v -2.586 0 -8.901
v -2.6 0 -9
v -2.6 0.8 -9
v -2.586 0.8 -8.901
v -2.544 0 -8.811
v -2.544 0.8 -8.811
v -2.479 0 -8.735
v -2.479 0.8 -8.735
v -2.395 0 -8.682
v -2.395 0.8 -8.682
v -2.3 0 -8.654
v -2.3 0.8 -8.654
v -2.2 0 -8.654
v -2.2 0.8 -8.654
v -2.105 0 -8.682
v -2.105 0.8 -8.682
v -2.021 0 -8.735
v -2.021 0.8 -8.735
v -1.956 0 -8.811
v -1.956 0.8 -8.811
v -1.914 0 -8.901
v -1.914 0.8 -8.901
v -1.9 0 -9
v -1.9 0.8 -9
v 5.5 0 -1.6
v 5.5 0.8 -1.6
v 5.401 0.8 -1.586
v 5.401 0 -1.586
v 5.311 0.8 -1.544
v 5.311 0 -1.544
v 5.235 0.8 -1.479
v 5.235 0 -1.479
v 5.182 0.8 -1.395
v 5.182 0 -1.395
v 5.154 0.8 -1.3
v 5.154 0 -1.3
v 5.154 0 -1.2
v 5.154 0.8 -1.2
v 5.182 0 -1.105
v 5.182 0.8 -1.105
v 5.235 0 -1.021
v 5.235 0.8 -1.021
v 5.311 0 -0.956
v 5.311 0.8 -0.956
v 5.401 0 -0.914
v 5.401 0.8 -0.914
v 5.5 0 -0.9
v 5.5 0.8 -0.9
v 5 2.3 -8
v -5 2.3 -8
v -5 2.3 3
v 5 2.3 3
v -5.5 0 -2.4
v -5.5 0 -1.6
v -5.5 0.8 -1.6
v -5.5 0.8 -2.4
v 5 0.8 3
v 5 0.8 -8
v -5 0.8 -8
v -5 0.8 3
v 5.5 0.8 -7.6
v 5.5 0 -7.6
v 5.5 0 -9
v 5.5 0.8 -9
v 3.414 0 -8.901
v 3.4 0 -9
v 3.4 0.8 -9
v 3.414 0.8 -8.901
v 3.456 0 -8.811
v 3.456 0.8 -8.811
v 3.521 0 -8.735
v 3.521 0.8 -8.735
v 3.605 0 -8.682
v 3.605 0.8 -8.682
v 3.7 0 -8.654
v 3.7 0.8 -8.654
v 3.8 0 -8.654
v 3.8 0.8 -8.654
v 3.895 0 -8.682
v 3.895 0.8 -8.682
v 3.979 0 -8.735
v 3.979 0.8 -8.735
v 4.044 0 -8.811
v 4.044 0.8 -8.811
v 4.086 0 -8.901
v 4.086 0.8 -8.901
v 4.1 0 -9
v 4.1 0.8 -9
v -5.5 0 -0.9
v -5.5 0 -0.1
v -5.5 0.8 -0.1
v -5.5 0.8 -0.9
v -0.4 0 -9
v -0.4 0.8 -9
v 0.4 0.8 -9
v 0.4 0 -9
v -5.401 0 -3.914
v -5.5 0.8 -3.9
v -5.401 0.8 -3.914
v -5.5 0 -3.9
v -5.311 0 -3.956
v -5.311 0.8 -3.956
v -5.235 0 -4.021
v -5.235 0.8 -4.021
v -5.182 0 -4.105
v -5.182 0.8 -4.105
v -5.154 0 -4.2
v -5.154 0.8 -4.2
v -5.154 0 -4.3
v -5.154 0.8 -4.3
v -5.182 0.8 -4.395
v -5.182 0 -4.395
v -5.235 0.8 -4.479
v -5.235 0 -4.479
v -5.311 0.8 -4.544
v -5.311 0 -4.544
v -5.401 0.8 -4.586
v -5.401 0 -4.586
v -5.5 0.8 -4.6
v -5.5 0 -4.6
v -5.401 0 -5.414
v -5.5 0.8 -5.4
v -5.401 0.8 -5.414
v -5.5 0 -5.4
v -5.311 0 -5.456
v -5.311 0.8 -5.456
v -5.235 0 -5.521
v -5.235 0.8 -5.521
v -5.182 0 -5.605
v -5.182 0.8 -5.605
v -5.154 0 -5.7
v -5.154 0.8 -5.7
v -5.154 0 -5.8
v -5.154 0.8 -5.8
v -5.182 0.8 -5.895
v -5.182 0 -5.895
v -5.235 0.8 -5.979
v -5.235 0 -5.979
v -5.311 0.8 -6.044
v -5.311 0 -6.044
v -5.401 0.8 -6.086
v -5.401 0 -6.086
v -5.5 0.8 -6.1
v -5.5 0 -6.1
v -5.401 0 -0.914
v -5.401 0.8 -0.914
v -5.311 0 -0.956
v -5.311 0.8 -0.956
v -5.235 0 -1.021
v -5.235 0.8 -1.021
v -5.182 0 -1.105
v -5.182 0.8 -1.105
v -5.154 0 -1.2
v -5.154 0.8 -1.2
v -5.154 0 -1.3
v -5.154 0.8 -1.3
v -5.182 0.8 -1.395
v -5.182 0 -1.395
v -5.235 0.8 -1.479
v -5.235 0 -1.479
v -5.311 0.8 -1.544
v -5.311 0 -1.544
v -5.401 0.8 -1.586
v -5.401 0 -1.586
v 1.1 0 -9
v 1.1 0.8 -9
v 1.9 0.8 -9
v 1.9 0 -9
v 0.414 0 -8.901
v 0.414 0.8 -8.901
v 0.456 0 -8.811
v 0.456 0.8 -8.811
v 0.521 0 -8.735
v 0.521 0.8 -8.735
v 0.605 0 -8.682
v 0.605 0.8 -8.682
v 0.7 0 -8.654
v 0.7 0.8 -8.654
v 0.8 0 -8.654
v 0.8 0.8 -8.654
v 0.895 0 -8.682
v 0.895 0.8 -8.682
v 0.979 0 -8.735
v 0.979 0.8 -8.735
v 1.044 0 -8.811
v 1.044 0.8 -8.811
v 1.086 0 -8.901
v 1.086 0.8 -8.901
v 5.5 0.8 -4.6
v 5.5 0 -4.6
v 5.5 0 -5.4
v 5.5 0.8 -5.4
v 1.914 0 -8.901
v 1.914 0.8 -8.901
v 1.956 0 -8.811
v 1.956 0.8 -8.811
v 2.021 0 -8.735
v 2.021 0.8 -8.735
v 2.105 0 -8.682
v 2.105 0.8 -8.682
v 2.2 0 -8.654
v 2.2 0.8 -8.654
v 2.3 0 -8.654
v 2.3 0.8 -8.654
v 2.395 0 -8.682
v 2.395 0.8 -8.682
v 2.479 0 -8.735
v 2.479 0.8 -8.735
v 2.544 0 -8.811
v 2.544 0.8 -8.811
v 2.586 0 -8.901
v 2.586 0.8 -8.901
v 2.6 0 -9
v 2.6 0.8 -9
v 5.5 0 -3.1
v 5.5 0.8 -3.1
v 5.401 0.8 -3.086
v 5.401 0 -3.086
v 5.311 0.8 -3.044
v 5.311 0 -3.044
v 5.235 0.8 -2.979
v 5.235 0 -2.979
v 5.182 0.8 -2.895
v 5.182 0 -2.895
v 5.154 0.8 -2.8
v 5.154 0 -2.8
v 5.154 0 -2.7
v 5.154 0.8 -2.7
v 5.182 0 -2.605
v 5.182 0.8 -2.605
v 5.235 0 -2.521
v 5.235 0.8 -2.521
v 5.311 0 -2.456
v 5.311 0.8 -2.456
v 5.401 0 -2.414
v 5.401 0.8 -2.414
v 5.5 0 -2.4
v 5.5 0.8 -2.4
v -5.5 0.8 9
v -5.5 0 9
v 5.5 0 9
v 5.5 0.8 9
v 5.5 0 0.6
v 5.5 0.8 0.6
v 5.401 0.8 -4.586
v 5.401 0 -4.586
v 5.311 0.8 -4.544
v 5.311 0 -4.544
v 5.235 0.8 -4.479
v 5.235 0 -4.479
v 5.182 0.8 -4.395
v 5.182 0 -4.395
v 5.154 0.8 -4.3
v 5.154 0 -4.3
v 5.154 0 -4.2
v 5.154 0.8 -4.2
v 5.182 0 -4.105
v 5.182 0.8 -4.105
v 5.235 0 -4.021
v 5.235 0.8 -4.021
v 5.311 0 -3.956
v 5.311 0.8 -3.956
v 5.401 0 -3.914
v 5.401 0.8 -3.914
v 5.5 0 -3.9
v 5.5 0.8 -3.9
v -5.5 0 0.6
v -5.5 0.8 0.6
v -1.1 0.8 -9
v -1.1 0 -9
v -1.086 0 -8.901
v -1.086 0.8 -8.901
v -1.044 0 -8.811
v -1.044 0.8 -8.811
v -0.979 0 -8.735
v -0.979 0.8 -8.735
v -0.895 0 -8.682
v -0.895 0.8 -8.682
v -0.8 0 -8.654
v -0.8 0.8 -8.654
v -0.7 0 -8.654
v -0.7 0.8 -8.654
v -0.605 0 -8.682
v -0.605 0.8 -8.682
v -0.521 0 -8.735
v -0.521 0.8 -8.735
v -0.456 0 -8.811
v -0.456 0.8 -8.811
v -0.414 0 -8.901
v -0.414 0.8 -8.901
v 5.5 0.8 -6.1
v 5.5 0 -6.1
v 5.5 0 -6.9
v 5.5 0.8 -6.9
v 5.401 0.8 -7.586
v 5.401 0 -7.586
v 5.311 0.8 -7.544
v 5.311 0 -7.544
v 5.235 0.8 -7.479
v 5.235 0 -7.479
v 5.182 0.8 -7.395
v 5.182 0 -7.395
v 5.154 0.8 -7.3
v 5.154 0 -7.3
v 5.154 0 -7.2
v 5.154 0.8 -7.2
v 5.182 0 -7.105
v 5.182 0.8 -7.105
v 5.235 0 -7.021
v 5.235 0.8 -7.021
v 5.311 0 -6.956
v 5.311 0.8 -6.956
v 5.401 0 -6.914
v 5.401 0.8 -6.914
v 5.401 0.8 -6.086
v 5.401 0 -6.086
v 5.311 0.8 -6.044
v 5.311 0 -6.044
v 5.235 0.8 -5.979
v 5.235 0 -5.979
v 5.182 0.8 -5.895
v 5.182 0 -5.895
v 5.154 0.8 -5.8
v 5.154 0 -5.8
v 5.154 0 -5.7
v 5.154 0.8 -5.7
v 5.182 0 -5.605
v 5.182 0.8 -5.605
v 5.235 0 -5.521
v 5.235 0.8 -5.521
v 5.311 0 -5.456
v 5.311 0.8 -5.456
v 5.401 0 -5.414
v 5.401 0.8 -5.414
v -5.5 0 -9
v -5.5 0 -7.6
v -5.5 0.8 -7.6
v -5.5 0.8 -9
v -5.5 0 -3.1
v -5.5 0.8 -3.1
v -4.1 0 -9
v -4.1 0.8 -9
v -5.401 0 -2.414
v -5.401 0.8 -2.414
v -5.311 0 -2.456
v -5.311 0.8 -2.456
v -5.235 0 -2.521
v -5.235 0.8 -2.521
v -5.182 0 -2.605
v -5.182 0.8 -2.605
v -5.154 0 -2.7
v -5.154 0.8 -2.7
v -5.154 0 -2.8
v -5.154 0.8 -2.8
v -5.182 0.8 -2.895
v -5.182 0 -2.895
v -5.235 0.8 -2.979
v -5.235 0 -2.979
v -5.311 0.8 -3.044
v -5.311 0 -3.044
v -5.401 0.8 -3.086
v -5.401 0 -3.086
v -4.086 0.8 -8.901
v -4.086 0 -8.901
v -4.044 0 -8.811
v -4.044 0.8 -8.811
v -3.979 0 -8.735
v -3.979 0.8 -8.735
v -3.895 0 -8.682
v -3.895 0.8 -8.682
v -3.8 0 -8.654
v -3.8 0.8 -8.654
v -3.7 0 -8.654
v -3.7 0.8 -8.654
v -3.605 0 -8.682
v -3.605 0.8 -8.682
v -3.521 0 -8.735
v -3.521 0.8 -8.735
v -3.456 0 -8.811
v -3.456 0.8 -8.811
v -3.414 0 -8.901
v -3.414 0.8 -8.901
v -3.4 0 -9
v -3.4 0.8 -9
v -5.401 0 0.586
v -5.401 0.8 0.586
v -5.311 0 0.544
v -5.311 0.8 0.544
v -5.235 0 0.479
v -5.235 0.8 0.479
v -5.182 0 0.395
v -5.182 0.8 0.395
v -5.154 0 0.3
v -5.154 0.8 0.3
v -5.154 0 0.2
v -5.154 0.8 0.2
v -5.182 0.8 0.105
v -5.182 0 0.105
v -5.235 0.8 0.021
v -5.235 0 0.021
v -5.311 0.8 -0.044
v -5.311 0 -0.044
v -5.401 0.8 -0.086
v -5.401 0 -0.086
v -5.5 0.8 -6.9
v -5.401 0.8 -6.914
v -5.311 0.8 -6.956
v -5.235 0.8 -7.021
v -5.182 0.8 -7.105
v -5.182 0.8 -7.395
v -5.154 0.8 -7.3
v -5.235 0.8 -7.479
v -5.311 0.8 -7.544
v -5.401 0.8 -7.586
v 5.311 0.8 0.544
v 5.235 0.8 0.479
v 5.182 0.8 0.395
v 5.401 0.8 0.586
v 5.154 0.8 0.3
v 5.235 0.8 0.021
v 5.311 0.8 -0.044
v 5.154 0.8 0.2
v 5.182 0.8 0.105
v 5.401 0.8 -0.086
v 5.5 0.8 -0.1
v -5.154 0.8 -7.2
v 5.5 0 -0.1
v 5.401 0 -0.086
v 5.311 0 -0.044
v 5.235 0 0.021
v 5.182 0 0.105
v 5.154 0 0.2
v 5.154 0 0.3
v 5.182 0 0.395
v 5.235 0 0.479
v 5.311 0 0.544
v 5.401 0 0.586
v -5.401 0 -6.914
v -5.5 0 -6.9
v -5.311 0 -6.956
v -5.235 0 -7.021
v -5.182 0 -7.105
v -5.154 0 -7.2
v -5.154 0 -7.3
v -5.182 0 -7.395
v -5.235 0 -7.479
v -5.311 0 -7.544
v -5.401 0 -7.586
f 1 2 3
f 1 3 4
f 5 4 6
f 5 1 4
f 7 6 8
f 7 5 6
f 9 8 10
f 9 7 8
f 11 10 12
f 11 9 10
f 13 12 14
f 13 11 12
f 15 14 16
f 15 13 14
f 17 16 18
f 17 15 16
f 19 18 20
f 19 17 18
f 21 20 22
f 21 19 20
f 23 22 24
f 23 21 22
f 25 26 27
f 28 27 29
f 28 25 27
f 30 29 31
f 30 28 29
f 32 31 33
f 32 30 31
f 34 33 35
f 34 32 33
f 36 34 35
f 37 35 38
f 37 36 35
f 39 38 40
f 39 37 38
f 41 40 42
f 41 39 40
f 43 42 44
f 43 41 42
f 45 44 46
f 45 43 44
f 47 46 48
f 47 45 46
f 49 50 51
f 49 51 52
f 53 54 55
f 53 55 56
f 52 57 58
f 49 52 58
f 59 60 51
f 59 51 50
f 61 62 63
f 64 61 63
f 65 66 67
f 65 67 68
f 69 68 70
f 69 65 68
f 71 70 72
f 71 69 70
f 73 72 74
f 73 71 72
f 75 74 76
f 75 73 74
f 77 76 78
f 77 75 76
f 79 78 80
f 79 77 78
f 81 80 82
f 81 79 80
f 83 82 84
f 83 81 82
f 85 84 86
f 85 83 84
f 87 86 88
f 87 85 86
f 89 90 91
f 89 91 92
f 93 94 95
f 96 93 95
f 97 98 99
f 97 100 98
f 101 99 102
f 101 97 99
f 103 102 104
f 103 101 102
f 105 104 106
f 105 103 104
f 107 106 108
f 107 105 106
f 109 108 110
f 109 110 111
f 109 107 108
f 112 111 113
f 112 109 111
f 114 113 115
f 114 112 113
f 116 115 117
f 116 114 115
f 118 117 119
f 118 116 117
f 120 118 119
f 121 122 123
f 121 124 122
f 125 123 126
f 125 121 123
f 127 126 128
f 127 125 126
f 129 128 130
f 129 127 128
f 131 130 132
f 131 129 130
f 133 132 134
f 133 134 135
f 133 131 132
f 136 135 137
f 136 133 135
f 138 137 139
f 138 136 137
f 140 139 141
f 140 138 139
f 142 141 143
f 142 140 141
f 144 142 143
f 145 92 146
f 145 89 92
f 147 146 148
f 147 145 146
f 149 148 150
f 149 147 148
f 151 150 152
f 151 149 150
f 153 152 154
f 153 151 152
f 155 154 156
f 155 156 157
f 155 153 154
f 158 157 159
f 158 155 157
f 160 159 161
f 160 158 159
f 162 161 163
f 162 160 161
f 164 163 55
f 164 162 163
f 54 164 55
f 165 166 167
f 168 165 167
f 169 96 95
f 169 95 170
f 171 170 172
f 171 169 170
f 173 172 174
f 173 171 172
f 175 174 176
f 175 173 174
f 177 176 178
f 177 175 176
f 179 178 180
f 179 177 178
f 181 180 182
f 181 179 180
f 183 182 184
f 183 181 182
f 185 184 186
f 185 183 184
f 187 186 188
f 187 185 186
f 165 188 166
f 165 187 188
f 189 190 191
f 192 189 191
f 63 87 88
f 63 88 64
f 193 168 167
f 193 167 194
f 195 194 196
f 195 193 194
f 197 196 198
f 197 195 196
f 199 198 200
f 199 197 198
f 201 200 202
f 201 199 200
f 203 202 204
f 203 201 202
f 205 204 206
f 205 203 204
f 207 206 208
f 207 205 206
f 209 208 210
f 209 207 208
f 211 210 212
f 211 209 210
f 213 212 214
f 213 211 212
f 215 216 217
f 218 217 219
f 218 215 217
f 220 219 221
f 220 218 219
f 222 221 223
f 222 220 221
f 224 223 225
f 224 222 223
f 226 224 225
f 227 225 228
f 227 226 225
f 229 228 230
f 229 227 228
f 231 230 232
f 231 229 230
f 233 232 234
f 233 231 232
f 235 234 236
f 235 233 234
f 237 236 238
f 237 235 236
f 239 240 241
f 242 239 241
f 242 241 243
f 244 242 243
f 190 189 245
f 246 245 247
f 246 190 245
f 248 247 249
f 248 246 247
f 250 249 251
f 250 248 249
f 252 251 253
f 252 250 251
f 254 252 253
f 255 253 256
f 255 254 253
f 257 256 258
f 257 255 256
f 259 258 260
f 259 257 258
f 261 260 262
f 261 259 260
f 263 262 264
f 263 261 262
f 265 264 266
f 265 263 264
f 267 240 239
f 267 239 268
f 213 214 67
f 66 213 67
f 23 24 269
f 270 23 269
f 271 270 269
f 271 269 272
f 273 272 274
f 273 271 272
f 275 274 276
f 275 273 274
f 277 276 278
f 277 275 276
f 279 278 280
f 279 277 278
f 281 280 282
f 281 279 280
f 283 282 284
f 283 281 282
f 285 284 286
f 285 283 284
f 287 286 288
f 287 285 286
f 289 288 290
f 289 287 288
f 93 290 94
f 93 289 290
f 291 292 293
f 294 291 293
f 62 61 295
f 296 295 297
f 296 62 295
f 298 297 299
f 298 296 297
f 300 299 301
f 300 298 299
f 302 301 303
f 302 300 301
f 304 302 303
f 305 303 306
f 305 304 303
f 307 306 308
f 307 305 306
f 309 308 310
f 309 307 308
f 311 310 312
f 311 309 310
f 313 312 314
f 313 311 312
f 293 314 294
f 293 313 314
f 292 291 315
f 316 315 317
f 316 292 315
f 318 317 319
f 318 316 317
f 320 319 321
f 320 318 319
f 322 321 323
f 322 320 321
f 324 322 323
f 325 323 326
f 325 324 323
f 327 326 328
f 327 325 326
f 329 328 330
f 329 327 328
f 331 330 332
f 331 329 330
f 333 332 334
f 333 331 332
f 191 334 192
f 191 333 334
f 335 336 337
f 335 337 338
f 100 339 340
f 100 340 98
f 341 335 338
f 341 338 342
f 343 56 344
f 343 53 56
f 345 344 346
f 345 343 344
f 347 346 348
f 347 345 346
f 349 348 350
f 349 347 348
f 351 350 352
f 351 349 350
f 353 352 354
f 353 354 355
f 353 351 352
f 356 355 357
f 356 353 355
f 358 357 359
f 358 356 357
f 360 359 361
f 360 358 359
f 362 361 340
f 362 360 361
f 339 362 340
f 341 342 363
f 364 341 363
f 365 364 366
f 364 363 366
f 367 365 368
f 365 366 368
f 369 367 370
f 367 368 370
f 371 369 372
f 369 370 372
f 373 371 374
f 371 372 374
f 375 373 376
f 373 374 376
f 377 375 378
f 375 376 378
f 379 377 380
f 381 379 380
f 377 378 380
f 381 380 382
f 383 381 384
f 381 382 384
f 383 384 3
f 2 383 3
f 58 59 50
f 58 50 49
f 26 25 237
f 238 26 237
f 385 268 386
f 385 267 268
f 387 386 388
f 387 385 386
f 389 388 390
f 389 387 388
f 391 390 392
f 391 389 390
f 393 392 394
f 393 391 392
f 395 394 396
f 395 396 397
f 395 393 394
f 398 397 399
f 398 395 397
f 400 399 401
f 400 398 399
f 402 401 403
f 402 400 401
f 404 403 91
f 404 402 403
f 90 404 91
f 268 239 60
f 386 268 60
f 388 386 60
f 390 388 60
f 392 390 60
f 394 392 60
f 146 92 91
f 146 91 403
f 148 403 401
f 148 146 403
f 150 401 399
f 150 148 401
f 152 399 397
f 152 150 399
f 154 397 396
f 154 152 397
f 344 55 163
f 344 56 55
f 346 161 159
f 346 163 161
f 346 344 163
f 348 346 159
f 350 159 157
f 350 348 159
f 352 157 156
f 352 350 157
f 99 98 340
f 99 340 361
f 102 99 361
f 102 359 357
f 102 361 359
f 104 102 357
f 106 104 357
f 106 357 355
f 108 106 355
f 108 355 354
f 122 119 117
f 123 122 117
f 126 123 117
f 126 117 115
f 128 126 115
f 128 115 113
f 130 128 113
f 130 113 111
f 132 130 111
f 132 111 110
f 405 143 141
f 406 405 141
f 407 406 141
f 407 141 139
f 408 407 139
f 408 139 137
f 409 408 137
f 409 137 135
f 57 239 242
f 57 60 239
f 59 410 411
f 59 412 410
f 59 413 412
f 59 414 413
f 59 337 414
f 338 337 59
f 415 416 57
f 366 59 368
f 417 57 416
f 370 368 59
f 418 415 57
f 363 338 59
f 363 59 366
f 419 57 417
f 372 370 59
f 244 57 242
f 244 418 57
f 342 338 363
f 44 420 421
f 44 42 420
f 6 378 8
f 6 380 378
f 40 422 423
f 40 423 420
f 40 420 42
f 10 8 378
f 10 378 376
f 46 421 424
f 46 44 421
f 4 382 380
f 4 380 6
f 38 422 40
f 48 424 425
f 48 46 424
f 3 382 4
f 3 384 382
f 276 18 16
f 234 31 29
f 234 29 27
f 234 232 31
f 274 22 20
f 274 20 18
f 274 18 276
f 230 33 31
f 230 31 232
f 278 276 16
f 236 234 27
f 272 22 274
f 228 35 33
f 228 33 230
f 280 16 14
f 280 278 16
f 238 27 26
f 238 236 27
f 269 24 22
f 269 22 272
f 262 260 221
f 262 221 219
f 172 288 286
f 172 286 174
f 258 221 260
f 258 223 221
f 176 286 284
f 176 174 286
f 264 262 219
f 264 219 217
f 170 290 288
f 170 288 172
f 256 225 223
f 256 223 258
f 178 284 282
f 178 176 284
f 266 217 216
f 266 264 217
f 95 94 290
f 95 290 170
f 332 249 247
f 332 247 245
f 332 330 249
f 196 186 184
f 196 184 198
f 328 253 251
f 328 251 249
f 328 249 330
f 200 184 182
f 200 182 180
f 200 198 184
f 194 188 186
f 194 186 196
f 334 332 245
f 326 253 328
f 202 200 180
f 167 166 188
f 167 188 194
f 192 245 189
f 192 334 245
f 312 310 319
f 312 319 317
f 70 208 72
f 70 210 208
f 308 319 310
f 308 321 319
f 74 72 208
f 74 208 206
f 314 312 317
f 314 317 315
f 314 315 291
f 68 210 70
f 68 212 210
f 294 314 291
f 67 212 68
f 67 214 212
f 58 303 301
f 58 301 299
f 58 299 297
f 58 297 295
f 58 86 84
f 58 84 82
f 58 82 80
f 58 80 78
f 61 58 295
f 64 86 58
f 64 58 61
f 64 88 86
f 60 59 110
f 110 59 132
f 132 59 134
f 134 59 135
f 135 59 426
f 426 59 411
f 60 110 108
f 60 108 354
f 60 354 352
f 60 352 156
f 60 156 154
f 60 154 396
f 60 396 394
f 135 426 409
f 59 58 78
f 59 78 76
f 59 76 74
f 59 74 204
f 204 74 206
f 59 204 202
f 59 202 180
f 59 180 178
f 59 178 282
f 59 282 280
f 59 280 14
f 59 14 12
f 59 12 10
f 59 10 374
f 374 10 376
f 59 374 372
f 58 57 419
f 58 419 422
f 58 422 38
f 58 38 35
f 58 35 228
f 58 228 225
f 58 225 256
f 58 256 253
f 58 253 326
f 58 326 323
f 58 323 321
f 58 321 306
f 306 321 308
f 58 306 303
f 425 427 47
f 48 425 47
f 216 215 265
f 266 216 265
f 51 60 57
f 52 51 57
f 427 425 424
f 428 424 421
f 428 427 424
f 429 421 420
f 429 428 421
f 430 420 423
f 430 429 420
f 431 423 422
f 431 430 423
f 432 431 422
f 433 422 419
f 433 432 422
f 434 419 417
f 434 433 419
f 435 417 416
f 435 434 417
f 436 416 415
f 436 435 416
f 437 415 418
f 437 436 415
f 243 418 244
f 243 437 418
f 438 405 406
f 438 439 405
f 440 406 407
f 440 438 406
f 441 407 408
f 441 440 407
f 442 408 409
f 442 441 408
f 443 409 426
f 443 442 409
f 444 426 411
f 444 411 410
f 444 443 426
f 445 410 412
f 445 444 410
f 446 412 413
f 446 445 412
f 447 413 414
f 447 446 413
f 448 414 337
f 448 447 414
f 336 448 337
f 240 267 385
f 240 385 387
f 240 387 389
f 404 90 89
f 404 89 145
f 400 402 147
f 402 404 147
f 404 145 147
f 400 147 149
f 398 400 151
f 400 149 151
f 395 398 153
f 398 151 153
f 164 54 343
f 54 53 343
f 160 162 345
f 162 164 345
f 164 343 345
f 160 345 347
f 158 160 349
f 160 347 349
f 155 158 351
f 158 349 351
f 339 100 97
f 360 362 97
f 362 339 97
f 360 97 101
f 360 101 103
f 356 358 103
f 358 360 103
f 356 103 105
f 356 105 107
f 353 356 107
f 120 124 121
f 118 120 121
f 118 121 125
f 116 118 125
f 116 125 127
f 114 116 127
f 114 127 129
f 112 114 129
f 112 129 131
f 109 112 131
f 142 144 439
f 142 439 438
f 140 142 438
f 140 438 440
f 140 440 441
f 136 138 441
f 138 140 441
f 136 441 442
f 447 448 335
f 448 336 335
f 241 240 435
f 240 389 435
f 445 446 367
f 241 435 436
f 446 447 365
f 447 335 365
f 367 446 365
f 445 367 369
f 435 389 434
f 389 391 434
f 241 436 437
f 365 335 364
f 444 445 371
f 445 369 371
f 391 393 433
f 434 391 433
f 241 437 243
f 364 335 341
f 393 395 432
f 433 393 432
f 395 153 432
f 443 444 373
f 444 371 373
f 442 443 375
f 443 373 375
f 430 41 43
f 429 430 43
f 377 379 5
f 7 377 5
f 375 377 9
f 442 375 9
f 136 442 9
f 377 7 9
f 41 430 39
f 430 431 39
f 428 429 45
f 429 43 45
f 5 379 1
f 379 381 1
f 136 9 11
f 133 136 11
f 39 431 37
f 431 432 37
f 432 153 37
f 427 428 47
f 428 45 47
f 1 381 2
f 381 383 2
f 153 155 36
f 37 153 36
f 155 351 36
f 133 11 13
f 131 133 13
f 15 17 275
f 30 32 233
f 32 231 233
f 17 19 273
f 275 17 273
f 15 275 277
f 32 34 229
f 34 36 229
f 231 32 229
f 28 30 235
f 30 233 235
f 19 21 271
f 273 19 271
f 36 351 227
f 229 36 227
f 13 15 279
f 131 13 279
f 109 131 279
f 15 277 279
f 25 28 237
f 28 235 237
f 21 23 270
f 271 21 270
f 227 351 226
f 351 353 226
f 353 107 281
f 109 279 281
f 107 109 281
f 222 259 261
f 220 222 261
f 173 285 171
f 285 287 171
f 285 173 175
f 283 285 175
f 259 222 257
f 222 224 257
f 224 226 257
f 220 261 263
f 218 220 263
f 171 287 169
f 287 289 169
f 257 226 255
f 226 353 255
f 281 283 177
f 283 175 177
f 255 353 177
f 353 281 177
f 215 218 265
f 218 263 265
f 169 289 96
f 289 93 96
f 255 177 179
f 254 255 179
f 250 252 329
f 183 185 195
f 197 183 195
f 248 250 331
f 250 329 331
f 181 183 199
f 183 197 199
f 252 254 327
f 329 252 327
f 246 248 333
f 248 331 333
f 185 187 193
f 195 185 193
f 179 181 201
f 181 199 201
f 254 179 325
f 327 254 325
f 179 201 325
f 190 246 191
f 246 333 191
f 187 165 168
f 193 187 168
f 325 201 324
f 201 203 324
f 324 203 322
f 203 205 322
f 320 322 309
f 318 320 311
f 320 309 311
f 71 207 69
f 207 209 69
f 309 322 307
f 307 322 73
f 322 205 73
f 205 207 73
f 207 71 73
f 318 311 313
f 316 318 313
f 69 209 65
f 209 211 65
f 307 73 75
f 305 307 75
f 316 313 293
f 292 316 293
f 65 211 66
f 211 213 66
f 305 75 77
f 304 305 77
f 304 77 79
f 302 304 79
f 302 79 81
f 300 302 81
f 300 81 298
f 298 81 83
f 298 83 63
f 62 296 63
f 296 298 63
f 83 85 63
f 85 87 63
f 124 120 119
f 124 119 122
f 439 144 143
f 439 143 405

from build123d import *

# Parameters (mm, degrees)
SKETCH_2_W               = 11
SKETCH_2_H               = 18
EXTRUDE_1_DEPTH          = 0.8
SKETCH_3_W               = 10
SKETCH_3_H               = 11
EXTRUDE_3_DEPTH          = 2.3
SKETCH_7_R               = 0.35
CUT_EXTRUDE_1_DEPTH      = 2.3
SKETCH_9_R               = 0.35
CUT_EXTRUDE_2_DEPTH      = 2.3
CUT_EXTRUDE_2_DEPTH_BACK = 2.3
SKETCH_10_R              = 0.35
CUT_EXTRUDE_5_DEPTH      = 2.3
CUT_EXTRUDE_5_DEPTH_BACK = 2.3


with BuildPart() as part:
    # 草图2 → 凸台-拉伸1 (new body)
    with BuildSketch(Plane(origin=(0, 0, 0), x_dir=(1, 0, 0), z_dir=(0, 1, 0))):
        Rectangle(SKETCH_2_W, SKETCH_2_H)
    extrude(amount=EXTRUDE_1_DEPTH)

    # 草图3 → 凸台-拉伸3 (add)
    with BuildSketch(Plane(origin=(0, 0, 0), x_dir=(1, 0, 0), z_dir=(0, 1, 0))):
        with Locations((0, 2.5)):
            Rectangle(SKETCH_3_W, SKETCH_3_H)
    extrude(amount=EXTRUDE_3_DEPTH)

    # 草图7 → 切除-拉伸1 (cut)
    with BuildSketch(Plane(origin=(0, 0.8, 0), x_dir=(1, 0, 0), z_dir=(0, 1, 0))):
        with Locations((-3.75, 9)):
            Circle(SKETCH_7_R)
    extrude(amount=-CUT_EXTRUDE_1_DEPTH, mode=Mode.SUBTRACT)

    # 草图9 → 切除-拉伸2 (cut, two sides)
    with BuildSketch(Plane(origin=(0, 0, 0), x_dir=(1, 0, 0), z_dir=(0, 1, 0))) as cut_extrude_2_sk:
        with Locations((-2.25, 9)):
            Circle(SKETCH_9_R)
        with Locations((-0.75, 9)):
            Circle(SKETCH_9_R)
        with Locations((0.75, 9)):
            Circle(SKETCH_9_R)
        with Locations((3.75, 9)):
            Circle(SKETCH_9_R)
        with Locations((2.25, 9)):
            Circle(SKETCH_9_R)
    extrude(amount=CUT_EXTRUDE_2_DEPTH, mode=Mode.SUBTRACT)
    extrude(cut_extrude_2_sk.sketch, amount=-CUT_EXTRUDE_2_DEPTH_BACK, mode=Mode.SUBTRACT)

    # 草图10 → 切除-拉伸5 (cut, two sides)
    with BuildSketch(Plane(origin=(0, 0, 0), x_dir=(1, 0, 0), z_dir=(0, 1, 0))) as cut_extrude_5_sk:
        with Locations((-5.5, 7.25)):
            Circle(SKETCH_10_R)
        with Locations((5.5, 7.25)):
            Circle(SKETCH_10_R)
        with Locations((5.5, -0.25)):
            Circle(SKETCH_10_R)
        with Locations((-5.5, 2.75)):
            Circle(SKETCH_10_R)
        with Locations((5.5, 5.75)):
            Circle(SKETCH_10_R)
        with Locations((-5.5, 4.25)):
            Circle(SKETCH_10_R)
        with Locations((5.5, 2.75)):
            Circle(SKETCH_10_R)
        with Locations((-5.5, 5.75)):
            Circle(SKETCH_10_R)
        with Locations((5.5, 4.25)):
            Circle(SKETCH_10_R)
        with Locations((5.5, 1.25)):
            Circle(SKETCH_10_R)
        with Locations((-5.5, 1.25)):
            Circle(SKETCH_10_R)
        with Locations((-5.5, -0.25)):
            Circle(SKETCH_10_R)
    extrude(amount=CUT_EXTRUDE_5_DEPTH, mode=Mode.SUBTRACT)
    extrude(cut_extrude_5_sk.sketch, amount=-CUT_EXTRUDE_5_DEPTH_BACK, mode=Mode.SUBTRACT)


solid = part.part
